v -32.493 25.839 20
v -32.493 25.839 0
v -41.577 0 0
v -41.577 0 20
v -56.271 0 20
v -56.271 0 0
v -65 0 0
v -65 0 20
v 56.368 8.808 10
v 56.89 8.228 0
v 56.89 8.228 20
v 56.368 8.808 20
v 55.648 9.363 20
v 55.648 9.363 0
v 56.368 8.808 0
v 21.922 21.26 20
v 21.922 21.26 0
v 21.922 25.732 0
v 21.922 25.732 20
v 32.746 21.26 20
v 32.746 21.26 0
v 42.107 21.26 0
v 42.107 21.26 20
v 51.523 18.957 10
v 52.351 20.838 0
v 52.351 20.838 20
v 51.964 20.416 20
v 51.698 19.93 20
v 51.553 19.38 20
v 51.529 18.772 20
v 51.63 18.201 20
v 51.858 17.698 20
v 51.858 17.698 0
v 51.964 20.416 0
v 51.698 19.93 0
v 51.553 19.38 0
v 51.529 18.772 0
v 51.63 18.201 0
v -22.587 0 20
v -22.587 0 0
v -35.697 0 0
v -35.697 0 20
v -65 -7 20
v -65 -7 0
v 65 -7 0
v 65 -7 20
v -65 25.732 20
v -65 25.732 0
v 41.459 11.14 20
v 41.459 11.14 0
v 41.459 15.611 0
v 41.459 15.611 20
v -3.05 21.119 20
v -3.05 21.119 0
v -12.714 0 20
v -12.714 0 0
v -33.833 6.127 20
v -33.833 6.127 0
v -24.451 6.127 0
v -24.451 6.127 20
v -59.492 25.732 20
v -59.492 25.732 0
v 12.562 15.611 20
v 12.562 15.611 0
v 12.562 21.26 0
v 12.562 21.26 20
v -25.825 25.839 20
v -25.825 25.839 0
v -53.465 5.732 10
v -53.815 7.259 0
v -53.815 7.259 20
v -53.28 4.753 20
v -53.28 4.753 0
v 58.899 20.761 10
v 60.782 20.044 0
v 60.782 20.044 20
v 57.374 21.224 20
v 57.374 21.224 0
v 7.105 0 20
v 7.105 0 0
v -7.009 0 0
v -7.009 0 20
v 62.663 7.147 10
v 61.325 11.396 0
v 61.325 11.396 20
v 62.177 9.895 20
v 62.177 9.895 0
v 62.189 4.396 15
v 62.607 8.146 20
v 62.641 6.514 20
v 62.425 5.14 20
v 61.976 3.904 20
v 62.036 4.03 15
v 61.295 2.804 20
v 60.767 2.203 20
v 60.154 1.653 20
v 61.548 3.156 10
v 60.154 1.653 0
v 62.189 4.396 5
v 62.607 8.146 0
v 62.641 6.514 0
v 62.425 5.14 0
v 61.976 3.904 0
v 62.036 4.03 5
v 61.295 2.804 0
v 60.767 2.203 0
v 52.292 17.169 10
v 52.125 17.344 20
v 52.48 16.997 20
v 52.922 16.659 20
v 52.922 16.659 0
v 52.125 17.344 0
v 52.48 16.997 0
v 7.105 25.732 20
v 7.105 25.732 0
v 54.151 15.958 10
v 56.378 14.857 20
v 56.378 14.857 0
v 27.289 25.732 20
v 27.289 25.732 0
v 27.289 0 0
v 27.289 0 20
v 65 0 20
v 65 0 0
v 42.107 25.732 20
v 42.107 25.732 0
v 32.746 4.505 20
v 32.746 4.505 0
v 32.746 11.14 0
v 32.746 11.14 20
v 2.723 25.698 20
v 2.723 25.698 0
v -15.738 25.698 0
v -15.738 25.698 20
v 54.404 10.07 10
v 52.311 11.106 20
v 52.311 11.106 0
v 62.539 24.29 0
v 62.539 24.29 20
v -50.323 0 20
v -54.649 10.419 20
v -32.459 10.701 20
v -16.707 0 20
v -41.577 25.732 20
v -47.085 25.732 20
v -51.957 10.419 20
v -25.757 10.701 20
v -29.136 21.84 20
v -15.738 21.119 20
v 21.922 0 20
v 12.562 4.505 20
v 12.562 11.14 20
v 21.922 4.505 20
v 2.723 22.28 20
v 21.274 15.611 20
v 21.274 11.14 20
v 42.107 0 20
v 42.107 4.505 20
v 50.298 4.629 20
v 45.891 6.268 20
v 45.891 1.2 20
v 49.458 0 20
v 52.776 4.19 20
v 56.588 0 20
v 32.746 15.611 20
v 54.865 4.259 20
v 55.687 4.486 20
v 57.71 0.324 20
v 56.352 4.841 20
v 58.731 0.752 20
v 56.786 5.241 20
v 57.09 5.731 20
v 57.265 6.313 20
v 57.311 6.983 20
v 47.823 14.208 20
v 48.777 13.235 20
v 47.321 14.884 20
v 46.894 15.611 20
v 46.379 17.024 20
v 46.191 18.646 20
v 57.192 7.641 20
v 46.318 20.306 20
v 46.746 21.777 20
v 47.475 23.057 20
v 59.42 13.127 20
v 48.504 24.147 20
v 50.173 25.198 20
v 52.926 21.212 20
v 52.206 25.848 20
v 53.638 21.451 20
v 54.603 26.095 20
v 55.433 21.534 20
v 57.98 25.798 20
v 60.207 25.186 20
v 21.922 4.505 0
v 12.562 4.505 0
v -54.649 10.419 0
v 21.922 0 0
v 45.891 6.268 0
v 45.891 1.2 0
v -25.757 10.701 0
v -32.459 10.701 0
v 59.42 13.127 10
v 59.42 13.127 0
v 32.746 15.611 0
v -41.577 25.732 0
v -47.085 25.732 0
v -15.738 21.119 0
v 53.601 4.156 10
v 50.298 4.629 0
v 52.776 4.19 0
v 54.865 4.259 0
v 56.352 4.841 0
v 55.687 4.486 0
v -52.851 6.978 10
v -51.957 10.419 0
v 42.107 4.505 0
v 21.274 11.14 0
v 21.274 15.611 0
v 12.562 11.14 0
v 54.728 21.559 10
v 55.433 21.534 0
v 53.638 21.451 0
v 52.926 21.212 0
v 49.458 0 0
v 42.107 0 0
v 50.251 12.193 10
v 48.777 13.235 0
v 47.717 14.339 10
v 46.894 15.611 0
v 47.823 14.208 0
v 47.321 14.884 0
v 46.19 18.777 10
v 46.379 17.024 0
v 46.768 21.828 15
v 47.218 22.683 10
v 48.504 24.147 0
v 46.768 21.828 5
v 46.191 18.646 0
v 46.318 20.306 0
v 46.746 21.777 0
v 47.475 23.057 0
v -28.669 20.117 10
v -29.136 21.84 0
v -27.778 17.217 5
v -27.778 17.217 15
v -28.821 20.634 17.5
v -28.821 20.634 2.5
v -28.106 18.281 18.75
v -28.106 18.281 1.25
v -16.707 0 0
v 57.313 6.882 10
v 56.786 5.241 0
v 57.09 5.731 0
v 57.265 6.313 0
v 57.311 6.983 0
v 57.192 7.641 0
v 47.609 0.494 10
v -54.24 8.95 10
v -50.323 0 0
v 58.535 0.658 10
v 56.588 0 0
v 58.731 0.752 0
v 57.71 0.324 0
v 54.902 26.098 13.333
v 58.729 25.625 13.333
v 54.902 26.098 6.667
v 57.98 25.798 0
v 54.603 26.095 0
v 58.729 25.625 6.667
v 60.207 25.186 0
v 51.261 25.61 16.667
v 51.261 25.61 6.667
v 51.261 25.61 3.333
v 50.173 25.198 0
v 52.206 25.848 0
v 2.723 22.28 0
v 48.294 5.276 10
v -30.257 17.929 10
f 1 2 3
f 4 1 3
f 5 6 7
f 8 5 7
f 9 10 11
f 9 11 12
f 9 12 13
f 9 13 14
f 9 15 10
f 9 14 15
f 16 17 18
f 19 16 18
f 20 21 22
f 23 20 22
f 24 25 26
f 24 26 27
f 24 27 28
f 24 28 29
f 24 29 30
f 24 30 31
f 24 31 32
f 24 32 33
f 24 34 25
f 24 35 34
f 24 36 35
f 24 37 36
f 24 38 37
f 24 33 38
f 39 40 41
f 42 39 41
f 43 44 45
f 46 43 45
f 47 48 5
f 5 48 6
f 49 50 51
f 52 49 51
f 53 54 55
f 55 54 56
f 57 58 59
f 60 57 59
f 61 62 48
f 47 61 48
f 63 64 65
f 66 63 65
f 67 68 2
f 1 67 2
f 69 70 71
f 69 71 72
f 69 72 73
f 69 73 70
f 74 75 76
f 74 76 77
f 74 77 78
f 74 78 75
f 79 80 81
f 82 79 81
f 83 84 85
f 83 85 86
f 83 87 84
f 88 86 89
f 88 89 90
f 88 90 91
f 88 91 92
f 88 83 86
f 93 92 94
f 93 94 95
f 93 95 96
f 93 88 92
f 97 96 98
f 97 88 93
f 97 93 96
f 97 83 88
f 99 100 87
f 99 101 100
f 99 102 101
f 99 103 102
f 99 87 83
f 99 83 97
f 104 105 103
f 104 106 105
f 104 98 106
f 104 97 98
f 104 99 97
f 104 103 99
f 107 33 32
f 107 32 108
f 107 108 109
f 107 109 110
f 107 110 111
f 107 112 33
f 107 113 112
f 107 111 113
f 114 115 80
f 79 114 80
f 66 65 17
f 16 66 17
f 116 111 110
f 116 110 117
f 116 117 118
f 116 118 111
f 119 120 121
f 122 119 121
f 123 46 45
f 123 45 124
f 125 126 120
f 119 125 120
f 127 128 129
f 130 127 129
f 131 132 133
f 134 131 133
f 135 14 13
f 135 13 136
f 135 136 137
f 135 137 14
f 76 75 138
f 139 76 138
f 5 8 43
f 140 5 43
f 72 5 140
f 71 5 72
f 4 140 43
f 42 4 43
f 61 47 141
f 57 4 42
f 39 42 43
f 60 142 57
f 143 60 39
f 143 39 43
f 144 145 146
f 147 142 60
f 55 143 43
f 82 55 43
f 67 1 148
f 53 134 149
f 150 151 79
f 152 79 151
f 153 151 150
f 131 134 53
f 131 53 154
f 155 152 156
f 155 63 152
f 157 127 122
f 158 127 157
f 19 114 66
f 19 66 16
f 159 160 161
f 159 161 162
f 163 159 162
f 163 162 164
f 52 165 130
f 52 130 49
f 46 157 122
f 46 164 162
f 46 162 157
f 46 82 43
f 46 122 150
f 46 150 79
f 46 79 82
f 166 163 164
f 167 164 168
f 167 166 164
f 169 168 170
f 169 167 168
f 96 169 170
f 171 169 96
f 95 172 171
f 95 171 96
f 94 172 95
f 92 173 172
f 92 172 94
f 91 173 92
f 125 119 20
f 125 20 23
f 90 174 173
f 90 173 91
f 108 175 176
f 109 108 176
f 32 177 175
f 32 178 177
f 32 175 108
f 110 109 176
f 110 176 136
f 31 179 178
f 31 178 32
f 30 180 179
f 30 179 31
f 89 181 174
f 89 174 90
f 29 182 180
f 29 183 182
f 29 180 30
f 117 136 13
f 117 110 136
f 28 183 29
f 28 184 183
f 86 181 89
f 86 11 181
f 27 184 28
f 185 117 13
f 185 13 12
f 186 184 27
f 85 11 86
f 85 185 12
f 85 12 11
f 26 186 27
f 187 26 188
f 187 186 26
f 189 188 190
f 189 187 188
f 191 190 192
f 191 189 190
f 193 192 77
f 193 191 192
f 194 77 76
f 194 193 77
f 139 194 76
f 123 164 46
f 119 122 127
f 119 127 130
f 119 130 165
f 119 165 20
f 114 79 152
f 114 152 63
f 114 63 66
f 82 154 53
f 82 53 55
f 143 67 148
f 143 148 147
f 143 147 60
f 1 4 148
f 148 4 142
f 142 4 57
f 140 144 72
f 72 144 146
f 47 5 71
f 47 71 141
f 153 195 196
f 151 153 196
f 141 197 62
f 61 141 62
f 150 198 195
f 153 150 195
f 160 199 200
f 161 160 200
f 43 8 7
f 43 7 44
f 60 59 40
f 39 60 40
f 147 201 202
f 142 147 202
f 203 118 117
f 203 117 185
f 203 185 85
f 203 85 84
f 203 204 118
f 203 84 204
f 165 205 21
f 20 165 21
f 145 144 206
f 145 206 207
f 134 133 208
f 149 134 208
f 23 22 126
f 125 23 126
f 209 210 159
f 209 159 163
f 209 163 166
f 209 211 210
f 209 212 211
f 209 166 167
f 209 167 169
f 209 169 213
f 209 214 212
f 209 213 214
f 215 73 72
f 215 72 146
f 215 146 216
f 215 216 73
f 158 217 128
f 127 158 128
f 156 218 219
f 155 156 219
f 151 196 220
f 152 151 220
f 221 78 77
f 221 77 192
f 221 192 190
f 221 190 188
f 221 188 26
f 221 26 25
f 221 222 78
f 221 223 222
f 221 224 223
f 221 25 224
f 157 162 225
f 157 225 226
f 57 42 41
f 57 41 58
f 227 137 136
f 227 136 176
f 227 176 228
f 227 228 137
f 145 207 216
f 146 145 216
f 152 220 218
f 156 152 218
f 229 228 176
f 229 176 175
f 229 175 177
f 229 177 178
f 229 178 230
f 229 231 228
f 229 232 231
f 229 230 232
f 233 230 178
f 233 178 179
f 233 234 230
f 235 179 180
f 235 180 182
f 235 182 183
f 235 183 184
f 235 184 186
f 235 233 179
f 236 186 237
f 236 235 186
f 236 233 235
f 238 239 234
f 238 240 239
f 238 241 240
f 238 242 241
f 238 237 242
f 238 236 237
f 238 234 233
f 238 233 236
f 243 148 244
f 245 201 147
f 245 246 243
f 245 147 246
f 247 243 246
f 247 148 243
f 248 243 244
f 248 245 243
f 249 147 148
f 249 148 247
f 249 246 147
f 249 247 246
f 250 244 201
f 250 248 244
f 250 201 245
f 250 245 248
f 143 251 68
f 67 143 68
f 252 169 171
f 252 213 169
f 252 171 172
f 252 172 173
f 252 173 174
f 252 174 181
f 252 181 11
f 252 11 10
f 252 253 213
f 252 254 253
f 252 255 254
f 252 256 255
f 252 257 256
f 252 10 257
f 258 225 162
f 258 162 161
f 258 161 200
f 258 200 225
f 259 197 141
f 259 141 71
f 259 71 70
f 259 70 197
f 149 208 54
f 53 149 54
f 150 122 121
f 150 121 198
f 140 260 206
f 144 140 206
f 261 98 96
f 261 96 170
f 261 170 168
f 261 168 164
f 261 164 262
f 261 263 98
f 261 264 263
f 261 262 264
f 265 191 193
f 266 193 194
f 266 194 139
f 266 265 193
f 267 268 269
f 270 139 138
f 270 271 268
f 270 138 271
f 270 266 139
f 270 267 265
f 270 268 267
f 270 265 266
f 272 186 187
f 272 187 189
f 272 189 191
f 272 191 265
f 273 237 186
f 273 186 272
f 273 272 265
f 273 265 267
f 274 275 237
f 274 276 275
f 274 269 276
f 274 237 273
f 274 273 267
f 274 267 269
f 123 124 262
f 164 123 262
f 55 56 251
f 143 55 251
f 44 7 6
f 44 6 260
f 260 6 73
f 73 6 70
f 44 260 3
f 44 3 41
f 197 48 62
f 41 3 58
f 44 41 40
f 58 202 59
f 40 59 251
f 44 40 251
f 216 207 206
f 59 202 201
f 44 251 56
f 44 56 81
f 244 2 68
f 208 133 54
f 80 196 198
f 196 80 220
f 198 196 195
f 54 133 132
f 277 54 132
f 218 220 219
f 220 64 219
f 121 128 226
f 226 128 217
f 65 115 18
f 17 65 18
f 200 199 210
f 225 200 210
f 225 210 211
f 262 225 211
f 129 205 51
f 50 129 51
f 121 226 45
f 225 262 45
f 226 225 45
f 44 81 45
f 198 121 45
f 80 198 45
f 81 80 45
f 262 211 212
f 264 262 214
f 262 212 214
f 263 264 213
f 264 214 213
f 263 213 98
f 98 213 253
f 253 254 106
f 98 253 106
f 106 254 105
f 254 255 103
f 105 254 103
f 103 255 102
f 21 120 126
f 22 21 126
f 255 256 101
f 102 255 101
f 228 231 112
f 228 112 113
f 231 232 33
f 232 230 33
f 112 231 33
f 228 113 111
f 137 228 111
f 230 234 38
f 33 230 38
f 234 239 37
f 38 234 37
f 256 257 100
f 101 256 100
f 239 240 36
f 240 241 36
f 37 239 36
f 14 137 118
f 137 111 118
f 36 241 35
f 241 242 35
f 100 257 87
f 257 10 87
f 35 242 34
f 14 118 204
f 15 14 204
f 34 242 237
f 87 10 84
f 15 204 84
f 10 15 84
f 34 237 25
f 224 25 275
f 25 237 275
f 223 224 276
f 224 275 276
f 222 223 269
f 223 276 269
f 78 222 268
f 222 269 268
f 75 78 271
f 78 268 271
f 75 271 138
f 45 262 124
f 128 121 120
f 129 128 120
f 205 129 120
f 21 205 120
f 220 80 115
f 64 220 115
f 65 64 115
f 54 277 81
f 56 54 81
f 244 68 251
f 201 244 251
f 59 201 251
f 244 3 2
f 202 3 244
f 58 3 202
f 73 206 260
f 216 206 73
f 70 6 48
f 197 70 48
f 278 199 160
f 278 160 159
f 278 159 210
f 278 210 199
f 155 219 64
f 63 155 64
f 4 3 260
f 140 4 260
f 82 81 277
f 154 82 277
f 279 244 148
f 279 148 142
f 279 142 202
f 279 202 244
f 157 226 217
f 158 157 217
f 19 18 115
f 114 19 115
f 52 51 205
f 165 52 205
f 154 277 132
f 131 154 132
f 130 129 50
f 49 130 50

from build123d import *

# Parameters (mm, degrees)
F1_DEPTH = 20


with BuildPart() as f1:
    # F0 (on Top) → F1 (new body)
    with BuildSketch(Plane.XY):
        with BuildLine():
            Line((-56.2706320669, 0), (-65, 0))
            Line((-65, 0), (-65, -7))
            Line((-65, -7), (65, -7))
            Line((65, -7), (65, 0))
            Line((65, 0), (56.5877659568, 0))
            add(Edge.make_bspline(
                [(56.5877659568, 0), (55.0561807697, -0.3548065676), (53.1787462635, -0.3548065676)],
                knots=[0.5796214889, 0.5796214889, 0.5796214889, 1, 1, 1], degree=2))
            add(Edge.make_bspline(
                [(53.1787462635, -0.3548065676), (51.2091468082, -0.3548065676), (49.45808763, 0)],
                knots=[0, 0, 0, 0.477766543, 0.477766543, 0.477766543], degree=2))
            Line((49.45808763, 0), (42.1065286141, 0))
            Line((42.1065286141, 0), (27.289130529, 0))
            Line((27.289130529, 0), (21.9219772127, 0))
            Line((21.9219772127, 0), (7.1045791275, 0))
            Line((7.1045791275, 0), (-7.0088376727, 0))
            Line((-7.0088376727, 0), (-12.7139020058, 0))
            Line((-12.7139020058, 0), (-16.7068838539, 0))
            Line((-16.7068838539, 0), (-22.5865355456, 0))
            Line((-22.5865355456, 0), (-35.6974829961, 0))
            Line((-35.6974829961, 0), (-41.5771346879, 0))
            Line((-41.5771346879, 0), (-50.3233981718, 0))
            Line((-50.3233981718, 0), (-56.2706320669, 0))
        make_face()
        with BuildLine():
            Line((-65, 25.7319239267), (-56.2706320669, 0))
            Line((-56.2706320669, 0), (-50.3233981718, 0))
            Line((-50.3233981718, 0), (-41.5771346879, 25.7319239267))
            Line((-41.5771346879, 25.7319239267), (-47.0850842611, 25.7319239267))
            Line((-47.0850842611, 25.7319239267), (-51.9566347528, 10.4189230169))
            add(Edge.make_bspline(
                [(-53.2801195685, 4.7532816358), (-53.0830048087, 6.369622666), (-51.9566347528, 10.4189230169)],
                knots=[0, 0, 0, 1, 1, 1], degree=2))
            add(Edge.make_bspline(
                [(-53.8151453451, 7.2594550102), (-53.3814928735, 5.4572629208), (-53.2801195685, 4.7532816358)],
                knots=[0, 0, 0, 1, 1, 1], degree=2))
            add(Edge.make_bspline(
                [(-54.6486591864, 10.4189230169), (-54.2487978166, 9.0616470996), (-53.8151453451, 7.2594550102)],
                knots=[0, 0, 0, 1, 1, 1], degree=2))
            Line((-54.6486591864, 10.4189230169), (-59.4920504267, 25.7319239267))
            Line((-59.4920504267, 25.7319239267), (-65, 25.7319239267))
        make_face()
        Polygon((-32.4929601872, 25.838929082), (-41.5771346879, 0), (-35.6974829961, 0), (-33.8333405537, 6.127453104), (-24.4506779881, 6.127453104), (-22.5865355456, 0), (-16.7068838539, 0), (-25.8248494563, 25.838929082), align=None)
        with BuildLine():
            add(Edge.make_bspline(
                [(-25.757267253, 10.7005155309), (-28.3422865312, 19.0243902439), (-28.6689338474, 20.1169691981)],
                knots=[0, 0, 0, 1, 1, 1], degree=2))
            Line((-25.757267253, 10.7005155309), (-32.4591690855, 10.7005155309))
            add(Edge.make_bspline(
                [(-29.1363774206, 21.8403153836), (-29.7164579994, 19.5875752718), (-32.4591690855, 10.7005155309)],
                knots=[0, 0, 0, 1, 1, 1], degree=2))
            add(Edge.make_bspline(
                [(-28.6689338474, 20.1169691981), (-28.9955811636, 21.2095481523), (-29.1363774206, 21.8403153836)],
                knots=[0, 0, 0, 1, 1, 1], degree=2))
        make_face(mode=Mode.SUBTRACT)
        with BuildLine():
            add(Edge.make_bspline(
                [(56.5877659568, 0), (55.0561807697, -0.3548065676), (53.1787462635, -0.3548065676)],
                knots=[0.5796214889, 0.5796214889, 0.5796214889, 1, 1, 1], degree=2))
            Line((56.5877659568, 0), (49.45808763, 0))
            add(Edge.make_bspline(
                [(53.1787462635, -0.3548065676), (51.2091468082, -0.3548065676), (49.45808763, 0)],
                knots=[0, 0, 0, 0.477766543, 0.477766543, 0.477766543], degree=2))
        make_face()
        with BuildLine():
            Line((49.45808763, 0), (56.5877659568, 0))
            add(Edge.make_bspline(
                [(60.1537928346, 1.652948057), (58.6995287211, 0.4892103321), (56.5877659568, 0)],
                knots=[0, 0, 0, 0.5796214889, 0.5796214889, 0.5796214889], degree=2))
            add(Edge.make_bspline(
                [(62.662782134, 7.1468180046), (62.662782134, 3.6607026816), (60.1537928346, 1.652948057)],
                knots=[0, 0, 0, 1, 1, 1], degree=2))
            add(Edge.make_bspline(
                [(61.3252176927, 11.3960490404), (62.662782134, 9.6642550795), (62.662782134, 7.1468180046)],
                knots=[0, 0, 0, 1, 1, 1], degree=2))
            add(Edge.make_bspline(
                [(56.3776372222, 14.8568210371), (59.9876532513, 13.1278430013), (61.3252176927, 11.3960490404)],
                knots=[0, 0, 0, 1, 1, 1], degree=2))
            add(Edge.make_bspline(
                [(52.9224970758, 16.6590131265), (53.651821687, 16.1577784517), (56.3776372222, 14.8568210371)],
                knots=[0, 0, 0, 1, 1, 1], degree=2))
            add(Edge.make_bspline(
                [(51.858077373, 17.6980895031), (52.1931724646, 17.1602478014), (52.9224970758, 16.6590131265)],
                knots=[0, 0, 0, 1, 1, 1], degree=2))
            add(Edge.make_bspline(
                [(51.5229822813, 18.9568080405), (51.5229822813, 18.2359312048), (51.858077373, 17.6980895031)],
                knots=[0, 0, 0, 1, 1, 1], degree=2))
            add(Edge.make_bspline(
                [(52.3508642724, 20.8378460339), (51.5229822813, 20.1169691981), (51.5229822813, 18.9568080405)],
                knots=[0, 0, 0, 1, 1, 1], degree=2))
            add(Edge.make_bspline(
                [(54.7275050903, 21.5587228696), (53.1787462635, 21.5587228696), (52.3508642724, 20.8378460339)],
                knots=[0, 0, 0, 1, 1, 1], degree=2))
            add(Edge.make_bspline(
                [(57.3744747217, 21.223627778), (56.0284625049, 21.5587228696), (54.7275050903, 21.5587228696)],
                knots=[0, 0, 0, 1, 1, 1], degree=2))
            add(Edge.make_bspline(
                [(60.7817441407, 20.0437551445), (58.7204869384, 20.8885326864), (57.3744747217, 21.223627778)],
                knots=[0, 0, 0, 1, 1, 1], degree=2))
            Line((60.7817441407, 20.0437551445), (62.5388814279, 24.2901702552))
            add(Edge.make_bspline(
                [(58.7289347139, 25.6249187714), (60.5508382793, 25.1518433479), (62.5388814279, 24.2901702552)],
                knots=[0, 0, 0, 1, 1, 1], degree=2))
            add(Edge.make_bspline(
                [(54.902092449, 26.0979941949), (56.9070311485, 26.0979941949), (58.7289347139, 25.6249187714)],
                knots=[0, 0, 0, 1, 1, 1], degree=2))
            add(Edge.make_bspline(
                [(48.5043105316, 24.146558073), (50.8190009964, 26.0979941949), (54.902092449, 26.0979941949)],
                knots=[0, 0, 0, 1, 1, 1], degree=2))
            add(Edge.make_bspline(
                [(46.1896200667, 18.7765888316), (46.1896200667, 22.1951219512), (48.5043105316, 24.146558073)],
                knots=[0, 0, 0, 1, 1, 1], degree=2))
            add(Edge.make_bspline(
                [(46.8936013516, 15.6114889746), (46.1896200667, 16.9687648919), (46.1896200667, 18.7765888316)],
                knots=[0, 0, 0, 1, 1, 1], degree=2))
            add(Edge.make_bspline(
                [(48.7774552701, 13.2348481567), (47.5975826366, 14.2542130572), (46.8936013516, 15.6114889746)],
                knots=[0, 0, 0, 1, 1, 1], degree=2))
            add(Edge.make_bspline(
                [(52.3114413205, 11.106008751), (49.9573279037, 12.2154832561), (48.7774552701, 13.2348481567)],
                knots=[0, 0, 0, 1, 1, 1], degree=2))
            add(Edge.make_bspline(
                [(55.648312611, 9.3629510895), (54.8288783954, 9.9064246415), (52.3114413205, 11.106008751)],
                knots=[0, 0, 0, 1, 1, 1], degree=2))
            add(Edge.make_bspline(
                [(56.8901355976, 8.2281332582), (56.4677468267, 8.8194775376), (55.648312611, 9.3629510895)],
                knots=[0, 0, 0, 1, 1, 1], degree=2))
            add(Edge.make_bspline(
                [(57.3125243686, 6.8821210415), (57.3125243686, 7.6367889789), (56.8901355976, 8.2281332582)],
                knots=[0, 0, 0, 1, 1, 1], degree=2))
            add(Edge.make_bspline(
                [(56.3522938959, 4.8405753152), (57.3125243686, 5.5248451241), (57.3125243686, 6.8821210415)],
                knots=[0, 0, 0, 1, 1, 1], degree=2))
            add(Edge.make_bspline(
                [(53.6011350344, 4.1563055062), (55.3920634233, 4.1563055062), (56.3522938959, 4.8405753152)],
                knots=[0, 0, 0, 1, 1, 1], degree=2))
            add(Edge.make_bspline(
                [(50.2980548456, 4.6293809297), (52.1030628601, 4.1563055062), (53.6011350344, 4.1563055062)],
                knots=[0, 0, 0, 1, 1, 1], degree=2))
            add(Edge.make_bspline(
                [(45.8911320019, 6.268249361), (48.493046831, 5.1024563532), (50.2980548456, 4.6293809297)],
                knots=[0, 0, 0, 1, 1, 1], degree=2))
            Line((45.8911320019, 6.268249361), (45.8911320019, 1.1995841095))
            add(Edge.make_bspline(
                [(49.45808763, 0), (47.5440530421, 0.3878292926), (45.8911320019, 1.1995841095)],
                knots=[0.477766543, 0.477766543, 0.477766543, 1, 1, 1], degree=2))
        make_face()
        Polygon((27.289130529, 0), (42.1065286141, 0), (42.1065286141, 4.5054802235), (32.7463934497, 4.5054802235), (32.7463934497, 11.1397998527), (41.458865832, 11.1397998527), (41.458865832, 15.6114889746), (32.7463934497, 15.6114889746), (32.7463934497, 21.2602348048), (42.1065286141, 21.2602348048), (42.1065286141, 25.7319239267), (27.289130529, 25.7319239267), align=None)
        Polygon((-3.0496469263, 21.1194385478), (-12.7139020058, 0), (-7.0088376727, 0), (2.7229996101, 22.2795997054), (2.7229996101, 25.698132825), (-15.7382056059, 25.698132825), (-15.7382056059, 21.1194385478), align=None)
        Polygon((7.1045791275, 0), (21.9219772127, 0), (21.9219772127, 4.5054802235), (12.5618420483, 4.5054802235), (12.5618420483, 11.1397998527), (21.2743144305, 11.1397998527), (21.2743144305, 15.6114889746), (12.5618420483, 15.6114889746), (12.5618420483, 21.2602348048), (21.9219772127, 21.2602348048), (21.9219772127, 25.7319239267), (7.1045791275, 25.7319239267), align=None)
    extrude(amount=F1_DEPTH)


solid = f1.part
